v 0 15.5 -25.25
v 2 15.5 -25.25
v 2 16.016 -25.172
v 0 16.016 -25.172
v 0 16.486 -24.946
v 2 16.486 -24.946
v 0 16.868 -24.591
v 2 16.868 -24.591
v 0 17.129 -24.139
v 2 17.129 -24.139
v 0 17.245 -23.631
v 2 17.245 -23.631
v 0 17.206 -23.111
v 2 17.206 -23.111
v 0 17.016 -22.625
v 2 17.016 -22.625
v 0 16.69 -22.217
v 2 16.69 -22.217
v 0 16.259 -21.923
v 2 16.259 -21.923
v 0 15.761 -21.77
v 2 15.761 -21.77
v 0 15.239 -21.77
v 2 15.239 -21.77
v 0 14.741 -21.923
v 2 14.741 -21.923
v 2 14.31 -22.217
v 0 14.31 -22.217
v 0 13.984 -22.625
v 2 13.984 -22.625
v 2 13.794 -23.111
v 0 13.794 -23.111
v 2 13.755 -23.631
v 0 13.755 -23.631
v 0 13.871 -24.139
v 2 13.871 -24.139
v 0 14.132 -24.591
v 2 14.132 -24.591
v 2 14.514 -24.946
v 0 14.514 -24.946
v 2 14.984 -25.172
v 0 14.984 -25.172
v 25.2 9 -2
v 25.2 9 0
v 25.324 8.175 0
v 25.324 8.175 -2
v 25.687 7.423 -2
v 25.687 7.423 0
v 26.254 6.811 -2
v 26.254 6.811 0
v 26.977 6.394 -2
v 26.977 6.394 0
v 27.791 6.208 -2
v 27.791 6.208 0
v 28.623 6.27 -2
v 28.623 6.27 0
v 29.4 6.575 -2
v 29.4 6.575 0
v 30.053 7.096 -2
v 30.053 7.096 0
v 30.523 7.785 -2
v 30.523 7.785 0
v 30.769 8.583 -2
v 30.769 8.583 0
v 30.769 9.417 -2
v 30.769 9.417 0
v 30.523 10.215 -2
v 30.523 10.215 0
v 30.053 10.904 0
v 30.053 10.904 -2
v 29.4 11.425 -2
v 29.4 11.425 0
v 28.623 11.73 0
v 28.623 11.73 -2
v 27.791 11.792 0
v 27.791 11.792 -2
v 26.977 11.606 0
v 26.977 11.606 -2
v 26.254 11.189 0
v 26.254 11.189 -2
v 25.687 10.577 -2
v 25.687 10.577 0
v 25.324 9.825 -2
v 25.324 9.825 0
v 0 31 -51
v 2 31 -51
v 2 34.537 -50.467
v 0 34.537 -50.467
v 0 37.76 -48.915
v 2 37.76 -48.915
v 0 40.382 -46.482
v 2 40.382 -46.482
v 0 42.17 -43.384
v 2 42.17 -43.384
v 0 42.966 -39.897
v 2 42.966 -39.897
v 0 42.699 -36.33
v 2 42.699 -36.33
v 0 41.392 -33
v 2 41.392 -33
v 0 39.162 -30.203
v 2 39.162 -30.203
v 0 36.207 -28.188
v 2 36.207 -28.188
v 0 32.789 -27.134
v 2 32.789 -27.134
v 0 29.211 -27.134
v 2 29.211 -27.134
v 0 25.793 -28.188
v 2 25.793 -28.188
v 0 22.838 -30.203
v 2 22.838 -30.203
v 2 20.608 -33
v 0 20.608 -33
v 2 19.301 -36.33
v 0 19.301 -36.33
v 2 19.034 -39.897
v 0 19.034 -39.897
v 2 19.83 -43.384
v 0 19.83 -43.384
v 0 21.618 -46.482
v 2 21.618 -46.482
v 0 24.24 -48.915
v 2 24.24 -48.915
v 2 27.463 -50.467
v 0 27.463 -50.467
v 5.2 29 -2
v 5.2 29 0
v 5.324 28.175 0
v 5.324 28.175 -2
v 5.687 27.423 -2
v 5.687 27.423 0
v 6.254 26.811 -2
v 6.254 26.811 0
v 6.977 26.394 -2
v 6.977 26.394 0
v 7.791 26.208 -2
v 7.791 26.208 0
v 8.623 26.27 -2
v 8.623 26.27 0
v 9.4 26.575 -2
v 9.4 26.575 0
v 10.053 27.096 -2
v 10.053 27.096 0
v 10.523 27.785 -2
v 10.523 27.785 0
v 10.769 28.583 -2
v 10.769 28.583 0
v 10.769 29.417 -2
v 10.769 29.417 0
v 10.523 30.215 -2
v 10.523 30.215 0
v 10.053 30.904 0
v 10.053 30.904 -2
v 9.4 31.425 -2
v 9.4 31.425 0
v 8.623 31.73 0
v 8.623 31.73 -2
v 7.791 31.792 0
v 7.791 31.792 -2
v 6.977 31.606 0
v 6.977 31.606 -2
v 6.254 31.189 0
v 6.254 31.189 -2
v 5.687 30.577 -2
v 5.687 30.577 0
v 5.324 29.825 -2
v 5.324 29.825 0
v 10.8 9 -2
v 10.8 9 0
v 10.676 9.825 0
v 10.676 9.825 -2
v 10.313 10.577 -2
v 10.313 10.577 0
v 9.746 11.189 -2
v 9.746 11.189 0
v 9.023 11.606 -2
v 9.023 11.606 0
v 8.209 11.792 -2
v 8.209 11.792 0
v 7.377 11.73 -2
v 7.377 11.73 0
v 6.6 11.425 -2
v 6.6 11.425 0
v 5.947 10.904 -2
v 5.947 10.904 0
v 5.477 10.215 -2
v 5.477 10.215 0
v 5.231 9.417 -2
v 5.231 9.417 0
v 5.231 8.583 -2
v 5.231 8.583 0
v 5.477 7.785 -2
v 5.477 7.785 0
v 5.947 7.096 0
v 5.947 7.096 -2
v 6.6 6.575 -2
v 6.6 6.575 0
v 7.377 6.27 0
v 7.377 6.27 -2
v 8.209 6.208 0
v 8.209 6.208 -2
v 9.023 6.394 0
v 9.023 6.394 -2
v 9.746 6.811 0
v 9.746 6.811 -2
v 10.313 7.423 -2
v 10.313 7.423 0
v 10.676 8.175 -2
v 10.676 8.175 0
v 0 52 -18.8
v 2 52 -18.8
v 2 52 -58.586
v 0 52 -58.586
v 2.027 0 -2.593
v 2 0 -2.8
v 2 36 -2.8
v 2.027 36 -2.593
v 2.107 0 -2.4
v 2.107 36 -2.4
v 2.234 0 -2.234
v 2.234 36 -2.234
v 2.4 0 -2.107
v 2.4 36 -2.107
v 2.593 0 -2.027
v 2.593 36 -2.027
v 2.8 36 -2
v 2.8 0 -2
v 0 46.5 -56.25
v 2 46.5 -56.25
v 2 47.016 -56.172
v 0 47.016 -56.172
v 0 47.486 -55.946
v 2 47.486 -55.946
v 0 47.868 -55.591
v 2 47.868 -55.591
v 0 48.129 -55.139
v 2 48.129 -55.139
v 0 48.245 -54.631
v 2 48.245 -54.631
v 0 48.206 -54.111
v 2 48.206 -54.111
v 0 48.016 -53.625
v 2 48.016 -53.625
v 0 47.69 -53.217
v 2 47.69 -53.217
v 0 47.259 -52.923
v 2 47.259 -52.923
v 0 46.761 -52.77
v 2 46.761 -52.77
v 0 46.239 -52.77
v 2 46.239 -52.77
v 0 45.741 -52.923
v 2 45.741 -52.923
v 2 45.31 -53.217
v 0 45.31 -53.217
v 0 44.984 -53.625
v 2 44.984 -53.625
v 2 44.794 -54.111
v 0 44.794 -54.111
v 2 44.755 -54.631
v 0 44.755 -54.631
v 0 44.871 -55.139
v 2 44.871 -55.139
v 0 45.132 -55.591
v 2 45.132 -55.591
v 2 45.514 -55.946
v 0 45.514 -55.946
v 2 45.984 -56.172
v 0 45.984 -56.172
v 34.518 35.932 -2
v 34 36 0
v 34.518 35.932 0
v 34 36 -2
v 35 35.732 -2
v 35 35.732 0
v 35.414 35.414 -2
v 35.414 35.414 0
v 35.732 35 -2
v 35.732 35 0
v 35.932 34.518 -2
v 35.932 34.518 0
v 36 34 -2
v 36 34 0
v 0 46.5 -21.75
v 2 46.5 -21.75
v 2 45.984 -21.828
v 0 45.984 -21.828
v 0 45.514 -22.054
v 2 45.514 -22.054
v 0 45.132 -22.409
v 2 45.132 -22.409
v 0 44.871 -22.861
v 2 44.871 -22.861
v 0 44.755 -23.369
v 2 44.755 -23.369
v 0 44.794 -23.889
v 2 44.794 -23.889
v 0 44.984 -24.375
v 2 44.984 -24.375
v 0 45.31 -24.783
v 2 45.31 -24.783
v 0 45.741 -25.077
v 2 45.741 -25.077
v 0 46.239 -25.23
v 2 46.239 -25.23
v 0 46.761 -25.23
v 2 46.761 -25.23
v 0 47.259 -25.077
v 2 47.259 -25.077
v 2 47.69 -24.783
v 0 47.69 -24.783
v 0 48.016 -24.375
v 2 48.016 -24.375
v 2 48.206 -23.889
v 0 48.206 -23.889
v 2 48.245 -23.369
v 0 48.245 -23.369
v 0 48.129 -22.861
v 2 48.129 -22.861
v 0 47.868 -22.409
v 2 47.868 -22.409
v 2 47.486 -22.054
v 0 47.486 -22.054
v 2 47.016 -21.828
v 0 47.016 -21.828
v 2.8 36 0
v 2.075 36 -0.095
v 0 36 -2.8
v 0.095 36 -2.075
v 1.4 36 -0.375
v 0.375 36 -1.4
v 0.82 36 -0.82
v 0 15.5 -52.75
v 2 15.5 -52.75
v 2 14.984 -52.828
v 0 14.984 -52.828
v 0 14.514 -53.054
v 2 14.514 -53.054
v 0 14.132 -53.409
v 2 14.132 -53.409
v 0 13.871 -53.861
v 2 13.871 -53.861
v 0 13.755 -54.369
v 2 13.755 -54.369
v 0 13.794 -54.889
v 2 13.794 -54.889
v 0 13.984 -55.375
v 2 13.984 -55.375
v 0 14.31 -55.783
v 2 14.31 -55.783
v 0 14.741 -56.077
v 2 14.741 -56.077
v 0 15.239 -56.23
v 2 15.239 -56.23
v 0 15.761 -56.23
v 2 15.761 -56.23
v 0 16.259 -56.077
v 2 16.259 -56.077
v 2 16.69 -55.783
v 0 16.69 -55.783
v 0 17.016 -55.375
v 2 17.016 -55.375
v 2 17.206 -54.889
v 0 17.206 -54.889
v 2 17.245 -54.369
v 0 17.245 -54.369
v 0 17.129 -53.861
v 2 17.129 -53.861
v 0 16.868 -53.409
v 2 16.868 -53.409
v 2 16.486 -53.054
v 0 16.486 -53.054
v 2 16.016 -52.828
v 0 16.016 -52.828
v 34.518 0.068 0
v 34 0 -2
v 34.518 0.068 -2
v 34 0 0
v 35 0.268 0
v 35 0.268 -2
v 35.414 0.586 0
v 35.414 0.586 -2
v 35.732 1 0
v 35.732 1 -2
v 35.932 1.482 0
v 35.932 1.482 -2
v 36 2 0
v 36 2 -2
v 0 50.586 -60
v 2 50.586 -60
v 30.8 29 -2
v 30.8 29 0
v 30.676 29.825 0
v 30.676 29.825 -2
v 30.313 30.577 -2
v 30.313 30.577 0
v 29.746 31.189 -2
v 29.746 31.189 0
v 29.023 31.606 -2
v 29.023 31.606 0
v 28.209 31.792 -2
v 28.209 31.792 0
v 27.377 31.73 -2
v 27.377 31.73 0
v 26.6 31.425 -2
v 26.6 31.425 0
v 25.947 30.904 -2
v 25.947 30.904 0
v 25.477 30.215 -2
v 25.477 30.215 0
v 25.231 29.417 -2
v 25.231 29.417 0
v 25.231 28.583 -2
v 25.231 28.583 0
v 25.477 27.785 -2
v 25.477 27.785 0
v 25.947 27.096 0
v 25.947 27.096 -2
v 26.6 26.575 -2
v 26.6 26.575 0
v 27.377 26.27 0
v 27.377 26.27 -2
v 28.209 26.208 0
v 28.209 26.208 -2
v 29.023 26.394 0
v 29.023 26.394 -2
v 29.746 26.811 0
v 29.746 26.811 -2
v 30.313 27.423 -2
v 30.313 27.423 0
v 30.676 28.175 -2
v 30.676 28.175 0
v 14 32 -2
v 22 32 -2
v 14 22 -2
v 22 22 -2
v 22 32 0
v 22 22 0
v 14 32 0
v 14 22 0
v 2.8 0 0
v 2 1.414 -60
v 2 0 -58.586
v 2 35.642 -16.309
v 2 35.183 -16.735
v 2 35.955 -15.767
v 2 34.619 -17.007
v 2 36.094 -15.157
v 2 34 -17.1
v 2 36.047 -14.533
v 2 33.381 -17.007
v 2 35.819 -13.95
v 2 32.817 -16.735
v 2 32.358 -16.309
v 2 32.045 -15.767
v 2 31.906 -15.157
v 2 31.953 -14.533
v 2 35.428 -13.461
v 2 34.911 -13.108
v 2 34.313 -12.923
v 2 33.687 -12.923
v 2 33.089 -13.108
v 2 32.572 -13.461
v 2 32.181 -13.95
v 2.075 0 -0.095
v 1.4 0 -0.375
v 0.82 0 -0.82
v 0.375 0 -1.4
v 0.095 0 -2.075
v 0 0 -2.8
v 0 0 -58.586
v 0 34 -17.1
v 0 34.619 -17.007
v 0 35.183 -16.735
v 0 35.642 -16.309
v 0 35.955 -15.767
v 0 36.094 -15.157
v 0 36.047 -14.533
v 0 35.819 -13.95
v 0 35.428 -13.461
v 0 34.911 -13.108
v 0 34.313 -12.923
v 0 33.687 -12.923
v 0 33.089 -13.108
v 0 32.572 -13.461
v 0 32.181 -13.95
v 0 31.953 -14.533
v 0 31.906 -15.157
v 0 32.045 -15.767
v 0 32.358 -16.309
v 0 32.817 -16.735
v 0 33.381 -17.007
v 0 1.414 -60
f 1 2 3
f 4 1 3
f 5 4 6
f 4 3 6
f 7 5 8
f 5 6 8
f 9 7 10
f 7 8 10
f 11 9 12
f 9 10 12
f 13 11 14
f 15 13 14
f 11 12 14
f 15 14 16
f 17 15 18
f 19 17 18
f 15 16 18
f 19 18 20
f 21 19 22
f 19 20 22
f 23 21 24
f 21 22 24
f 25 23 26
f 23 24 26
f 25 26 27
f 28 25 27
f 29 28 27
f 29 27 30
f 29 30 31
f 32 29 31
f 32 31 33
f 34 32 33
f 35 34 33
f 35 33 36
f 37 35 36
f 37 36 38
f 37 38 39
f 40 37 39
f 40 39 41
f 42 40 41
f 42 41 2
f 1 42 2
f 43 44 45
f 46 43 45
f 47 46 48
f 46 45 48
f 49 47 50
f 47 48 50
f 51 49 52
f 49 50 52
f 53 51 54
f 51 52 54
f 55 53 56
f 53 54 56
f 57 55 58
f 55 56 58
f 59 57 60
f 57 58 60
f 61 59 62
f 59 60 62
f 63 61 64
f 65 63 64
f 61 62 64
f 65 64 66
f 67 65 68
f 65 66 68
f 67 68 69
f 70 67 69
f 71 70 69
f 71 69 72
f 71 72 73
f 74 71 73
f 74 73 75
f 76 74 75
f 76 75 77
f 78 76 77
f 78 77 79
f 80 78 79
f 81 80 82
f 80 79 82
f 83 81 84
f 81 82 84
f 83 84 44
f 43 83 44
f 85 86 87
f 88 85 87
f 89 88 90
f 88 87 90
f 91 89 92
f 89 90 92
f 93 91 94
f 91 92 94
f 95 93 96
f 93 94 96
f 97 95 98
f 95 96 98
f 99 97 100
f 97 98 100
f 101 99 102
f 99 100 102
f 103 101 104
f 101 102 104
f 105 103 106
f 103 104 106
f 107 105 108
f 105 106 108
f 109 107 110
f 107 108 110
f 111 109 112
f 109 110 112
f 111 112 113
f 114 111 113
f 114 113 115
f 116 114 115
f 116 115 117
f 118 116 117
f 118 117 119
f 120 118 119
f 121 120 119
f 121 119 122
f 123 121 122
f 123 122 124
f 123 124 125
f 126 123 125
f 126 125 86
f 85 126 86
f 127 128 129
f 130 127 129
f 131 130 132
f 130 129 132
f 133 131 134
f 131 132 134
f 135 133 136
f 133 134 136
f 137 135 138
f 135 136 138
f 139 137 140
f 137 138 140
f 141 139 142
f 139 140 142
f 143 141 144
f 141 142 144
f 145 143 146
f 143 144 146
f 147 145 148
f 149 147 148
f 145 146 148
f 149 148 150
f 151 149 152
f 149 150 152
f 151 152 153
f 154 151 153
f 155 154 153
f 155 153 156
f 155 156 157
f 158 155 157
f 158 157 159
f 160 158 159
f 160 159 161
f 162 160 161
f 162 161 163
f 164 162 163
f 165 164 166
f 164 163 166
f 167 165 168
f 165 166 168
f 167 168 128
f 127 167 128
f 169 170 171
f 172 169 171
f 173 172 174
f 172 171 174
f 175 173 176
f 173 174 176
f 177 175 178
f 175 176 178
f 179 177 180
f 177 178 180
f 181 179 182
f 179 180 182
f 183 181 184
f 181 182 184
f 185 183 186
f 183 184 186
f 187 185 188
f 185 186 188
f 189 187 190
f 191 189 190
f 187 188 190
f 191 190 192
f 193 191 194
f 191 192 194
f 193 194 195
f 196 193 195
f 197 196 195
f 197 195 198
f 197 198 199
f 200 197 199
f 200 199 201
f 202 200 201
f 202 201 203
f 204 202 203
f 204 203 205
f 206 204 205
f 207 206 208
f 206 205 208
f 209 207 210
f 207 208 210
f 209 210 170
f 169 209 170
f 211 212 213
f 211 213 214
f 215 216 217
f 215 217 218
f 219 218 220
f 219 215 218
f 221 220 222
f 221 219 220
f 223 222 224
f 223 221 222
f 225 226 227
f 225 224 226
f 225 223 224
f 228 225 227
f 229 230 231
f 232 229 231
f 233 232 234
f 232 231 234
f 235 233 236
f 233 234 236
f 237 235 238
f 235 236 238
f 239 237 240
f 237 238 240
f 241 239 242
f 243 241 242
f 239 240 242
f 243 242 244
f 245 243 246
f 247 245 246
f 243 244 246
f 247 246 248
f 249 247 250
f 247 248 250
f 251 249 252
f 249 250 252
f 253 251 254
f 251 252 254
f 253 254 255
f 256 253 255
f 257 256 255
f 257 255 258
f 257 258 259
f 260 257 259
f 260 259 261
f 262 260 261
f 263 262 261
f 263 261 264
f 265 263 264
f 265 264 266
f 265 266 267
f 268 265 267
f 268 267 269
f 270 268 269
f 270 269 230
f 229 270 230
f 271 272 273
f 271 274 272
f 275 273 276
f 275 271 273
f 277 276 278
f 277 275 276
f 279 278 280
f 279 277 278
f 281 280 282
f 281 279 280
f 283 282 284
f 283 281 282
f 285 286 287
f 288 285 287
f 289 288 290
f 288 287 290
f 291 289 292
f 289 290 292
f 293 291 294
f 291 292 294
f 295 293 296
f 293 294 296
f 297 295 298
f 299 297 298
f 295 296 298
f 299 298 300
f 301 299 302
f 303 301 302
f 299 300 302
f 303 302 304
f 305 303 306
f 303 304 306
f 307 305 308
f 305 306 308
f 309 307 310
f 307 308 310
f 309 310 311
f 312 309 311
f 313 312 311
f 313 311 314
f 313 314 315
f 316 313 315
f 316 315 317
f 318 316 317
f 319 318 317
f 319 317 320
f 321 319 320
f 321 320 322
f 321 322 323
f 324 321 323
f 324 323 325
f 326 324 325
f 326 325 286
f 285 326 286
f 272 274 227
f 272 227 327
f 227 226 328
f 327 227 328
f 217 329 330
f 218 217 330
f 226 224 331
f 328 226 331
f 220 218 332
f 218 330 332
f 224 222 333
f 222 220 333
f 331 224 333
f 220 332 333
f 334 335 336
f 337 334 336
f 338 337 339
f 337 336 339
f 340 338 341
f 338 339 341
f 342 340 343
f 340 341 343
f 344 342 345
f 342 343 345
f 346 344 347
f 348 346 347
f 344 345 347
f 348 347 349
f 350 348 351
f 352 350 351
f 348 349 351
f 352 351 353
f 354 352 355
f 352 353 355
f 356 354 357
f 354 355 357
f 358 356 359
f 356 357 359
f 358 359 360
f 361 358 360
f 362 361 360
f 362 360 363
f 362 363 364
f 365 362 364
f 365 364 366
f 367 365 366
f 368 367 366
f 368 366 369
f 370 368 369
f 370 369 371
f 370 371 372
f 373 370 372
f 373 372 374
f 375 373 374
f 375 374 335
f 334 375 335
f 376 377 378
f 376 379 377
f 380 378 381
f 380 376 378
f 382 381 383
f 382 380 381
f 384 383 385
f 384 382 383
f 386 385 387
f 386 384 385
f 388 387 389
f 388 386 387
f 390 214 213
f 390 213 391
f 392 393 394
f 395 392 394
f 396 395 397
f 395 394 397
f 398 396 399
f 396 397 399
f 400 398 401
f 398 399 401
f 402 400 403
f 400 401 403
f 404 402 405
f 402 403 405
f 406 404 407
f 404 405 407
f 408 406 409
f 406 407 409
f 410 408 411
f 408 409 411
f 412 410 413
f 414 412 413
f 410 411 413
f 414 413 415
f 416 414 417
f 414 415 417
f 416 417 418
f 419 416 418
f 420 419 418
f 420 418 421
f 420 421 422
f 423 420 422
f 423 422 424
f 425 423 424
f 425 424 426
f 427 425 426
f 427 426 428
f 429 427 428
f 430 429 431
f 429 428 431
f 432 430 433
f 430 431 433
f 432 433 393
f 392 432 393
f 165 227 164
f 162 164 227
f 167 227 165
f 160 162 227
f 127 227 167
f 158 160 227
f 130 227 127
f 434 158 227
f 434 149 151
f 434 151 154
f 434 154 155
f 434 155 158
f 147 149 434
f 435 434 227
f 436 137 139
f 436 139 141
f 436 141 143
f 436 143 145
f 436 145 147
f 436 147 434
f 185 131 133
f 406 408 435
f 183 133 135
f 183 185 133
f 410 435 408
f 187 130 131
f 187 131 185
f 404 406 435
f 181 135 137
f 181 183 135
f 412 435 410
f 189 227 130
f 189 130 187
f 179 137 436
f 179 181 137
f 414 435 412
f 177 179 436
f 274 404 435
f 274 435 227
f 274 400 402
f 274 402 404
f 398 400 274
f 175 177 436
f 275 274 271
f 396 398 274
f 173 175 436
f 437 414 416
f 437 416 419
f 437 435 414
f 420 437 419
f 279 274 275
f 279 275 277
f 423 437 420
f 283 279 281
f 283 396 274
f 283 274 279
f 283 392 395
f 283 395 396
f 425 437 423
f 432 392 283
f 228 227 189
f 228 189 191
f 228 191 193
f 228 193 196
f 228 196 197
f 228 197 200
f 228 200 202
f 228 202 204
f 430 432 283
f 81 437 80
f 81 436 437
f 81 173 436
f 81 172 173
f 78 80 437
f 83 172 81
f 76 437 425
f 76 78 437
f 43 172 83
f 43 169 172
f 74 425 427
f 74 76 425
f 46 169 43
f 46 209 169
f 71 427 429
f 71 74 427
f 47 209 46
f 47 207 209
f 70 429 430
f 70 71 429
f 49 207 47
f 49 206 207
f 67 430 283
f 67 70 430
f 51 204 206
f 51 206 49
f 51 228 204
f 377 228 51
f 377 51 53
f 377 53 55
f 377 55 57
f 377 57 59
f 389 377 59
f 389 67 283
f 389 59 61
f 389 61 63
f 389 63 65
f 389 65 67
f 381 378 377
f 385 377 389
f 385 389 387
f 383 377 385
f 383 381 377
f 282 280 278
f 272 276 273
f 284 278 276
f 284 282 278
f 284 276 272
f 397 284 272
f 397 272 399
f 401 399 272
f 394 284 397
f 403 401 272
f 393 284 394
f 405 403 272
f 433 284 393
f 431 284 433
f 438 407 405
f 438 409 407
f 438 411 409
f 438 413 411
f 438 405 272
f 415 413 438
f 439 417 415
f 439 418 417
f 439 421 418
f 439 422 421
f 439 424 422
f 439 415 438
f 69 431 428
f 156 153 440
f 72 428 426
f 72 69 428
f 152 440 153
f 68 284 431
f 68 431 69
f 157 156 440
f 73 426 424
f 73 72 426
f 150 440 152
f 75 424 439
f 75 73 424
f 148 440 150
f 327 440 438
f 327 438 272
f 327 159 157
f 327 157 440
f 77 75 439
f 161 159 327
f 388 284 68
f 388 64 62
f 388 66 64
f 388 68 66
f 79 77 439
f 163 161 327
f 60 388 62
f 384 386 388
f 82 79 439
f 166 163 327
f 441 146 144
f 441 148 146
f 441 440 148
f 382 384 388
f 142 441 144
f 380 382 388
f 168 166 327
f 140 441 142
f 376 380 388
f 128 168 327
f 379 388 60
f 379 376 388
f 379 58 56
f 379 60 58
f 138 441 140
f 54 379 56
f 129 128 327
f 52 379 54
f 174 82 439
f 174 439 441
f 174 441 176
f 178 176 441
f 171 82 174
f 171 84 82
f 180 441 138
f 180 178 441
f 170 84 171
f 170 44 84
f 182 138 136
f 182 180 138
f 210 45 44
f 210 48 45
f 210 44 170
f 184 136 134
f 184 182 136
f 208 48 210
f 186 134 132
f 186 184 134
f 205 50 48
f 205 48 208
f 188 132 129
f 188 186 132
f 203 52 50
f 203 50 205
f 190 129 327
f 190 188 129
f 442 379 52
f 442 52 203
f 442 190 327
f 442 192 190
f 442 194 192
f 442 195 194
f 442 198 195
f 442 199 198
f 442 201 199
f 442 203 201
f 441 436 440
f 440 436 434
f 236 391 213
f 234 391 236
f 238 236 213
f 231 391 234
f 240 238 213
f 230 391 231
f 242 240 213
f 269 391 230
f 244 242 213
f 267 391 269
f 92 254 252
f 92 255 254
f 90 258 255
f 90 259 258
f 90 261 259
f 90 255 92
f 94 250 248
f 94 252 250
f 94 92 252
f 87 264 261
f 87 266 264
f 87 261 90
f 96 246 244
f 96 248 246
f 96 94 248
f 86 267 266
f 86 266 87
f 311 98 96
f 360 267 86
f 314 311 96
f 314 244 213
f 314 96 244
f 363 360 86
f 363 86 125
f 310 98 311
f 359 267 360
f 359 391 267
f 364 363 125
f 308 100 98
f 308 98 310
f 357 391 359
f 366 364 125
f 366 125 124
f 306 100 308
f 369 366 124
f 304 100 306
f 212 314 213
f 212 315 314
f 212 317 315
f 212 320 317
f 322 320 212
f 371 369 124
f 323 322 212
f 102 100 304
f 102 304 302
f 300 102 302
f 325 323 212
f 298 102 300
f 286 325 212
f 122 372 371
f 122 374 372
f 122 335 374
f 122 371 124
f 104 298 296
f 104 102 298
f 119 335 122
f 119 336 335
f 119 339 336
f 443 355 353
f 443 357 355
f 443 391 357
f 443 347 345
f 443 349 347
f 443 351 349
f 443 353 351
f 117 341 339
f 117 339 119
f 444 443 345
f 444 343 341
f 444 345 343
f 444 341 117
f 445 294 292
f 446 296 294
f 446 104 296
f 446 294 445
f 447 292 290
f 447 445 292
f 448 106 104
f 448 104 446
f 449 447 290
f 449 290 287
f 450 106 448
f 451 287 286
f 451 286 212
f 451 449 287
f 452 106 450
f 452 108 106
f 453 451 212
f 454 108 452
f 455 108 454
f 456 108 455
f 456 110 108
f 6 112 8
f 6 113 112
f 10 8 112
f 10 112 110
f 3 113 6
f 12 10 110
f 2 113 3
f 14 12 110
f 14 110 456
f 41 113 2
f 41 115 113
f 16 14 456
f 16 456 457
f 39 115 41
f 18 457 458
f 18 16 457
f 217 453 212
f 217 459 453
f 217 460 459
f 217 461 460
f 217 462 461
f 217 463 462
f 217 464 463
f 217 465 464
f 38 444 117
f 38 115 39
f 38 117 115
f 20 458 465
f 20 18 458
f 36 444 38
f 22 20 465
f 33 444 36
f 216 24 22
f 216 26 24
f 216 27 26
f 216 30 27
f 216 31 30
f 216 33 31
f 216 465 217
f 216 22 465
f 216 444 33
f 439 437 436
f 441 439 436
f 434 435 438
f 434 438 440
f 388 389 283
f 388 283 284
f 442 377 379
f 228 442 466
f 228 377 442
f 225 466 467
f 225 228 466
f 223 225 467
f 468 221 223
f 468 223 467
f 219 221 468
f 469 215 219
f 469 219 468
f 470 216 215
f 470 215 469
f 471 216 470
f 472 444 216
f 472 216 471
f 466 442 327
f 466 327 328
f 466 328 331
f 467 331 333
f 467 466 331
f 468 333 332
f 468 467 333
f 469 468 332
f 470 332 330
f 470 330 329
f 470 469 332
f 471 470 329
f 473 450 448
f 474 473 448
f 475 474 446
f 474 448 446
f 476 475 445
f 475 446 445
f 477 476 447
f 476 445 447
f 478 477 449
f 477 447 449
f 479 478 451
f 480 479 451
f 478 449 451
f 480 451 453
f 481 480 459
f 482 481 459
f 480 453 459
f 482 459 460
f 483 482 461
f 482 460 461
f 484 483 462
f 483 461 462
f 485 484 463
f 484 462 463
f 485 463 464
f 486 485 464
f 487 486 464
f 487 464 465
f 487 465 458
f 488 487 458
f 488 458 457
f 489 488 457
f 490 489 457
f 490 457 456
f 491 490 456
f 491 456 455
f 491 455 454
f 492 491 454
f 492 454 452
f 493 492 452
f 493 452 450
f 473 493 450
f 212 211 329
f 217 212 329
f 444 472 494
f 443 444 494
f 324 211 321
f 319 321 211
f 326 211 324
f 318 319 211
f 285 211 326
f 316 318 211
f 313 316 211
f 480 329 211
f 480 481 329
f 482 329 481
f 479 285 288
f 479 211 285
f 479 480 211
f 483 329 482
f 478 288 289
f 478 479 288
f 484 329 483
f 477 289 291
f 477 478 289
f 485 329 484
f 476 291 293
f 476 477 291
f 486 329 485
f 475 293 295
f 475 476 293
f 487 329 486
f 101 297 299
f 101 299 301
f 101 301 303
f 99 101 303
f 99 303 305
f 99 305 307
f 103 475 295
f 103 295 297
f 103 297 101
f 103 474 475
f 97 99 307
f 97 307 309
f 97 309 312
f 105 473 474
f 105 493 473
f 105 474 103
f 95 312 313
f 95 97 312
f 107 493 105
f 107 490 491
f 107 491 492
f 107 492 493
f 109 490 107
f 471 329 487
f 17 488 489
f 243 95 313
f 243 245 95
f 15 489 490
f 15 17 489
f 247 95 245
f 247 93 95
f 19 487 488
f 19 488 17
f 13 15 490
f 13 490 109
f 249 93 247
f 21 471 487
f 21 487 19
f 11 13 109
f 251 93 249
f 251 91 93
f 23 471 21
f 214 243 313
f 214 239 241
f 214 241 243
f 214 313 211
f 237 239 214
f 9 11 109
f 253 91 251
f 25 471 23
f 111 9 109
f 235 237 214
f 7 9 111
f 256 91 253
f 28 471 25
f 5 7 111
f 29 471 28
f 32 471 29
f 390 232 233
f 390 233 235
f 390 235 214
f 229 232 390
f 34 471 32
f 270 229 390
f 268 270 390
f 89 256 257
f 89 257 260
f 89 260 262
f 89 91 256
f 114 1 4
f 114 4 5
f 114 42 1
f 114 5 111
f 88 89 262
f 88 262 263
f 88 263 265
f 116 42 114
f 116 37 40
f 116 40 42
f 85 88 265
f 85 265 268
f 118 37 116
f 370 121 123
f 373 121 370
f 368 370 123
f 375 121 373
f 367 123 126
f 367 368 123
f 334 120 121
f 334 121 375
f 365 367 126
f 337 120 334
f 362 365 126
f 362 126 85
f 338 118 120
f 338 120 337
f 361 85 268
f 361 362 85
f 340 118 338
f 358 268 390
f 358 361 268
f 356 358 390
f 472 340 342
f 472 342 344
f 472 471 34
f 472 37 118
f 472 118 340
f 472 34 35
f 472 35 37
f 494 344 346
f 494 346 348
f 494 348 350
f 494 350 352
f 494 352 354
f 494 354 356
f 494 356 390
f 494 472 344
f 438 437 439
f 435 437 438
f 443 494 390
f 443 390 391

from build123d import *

# Parameters (mm, degrees)
BASE_FLANGE1_DEPTH = 52
CUT_EXTRUDE1_DEPTH = 88.177978871
FILLET1_R          = 2
SKETCH7_R          = 12
SKETCH7_R_2        = 1.75
CUT_EXTRUDE2_DEPTH = 10
SKETCH8_R          = 2.8
CUT_EXTRUDE3_DEPTH = 2
SKETCH9_W          = 8
SKETCH9_H          = 10
CUT_EXTRUDE4_DEPTH = 10
SKETCH10_R         = 2.1
CUT_EXTRUDE5_DEPTH = 10


# Sheet-metal steps are written as plain solids
with BuildPart() as part:
    # Sketch1 → Base-Flange1 (new body)
    with BuildSketch(Plane(origin=(0, 0, 0), x_dir=(1, 0, 0), z_dir=(0, 1, 0))):
        with BuildLine():
            Line((36, 0), (2.8, 0))
            ThreePointArc((2.8, 0), (0.820101013, 0.820101013), (0, 2.8))
            Line((0, 2.8), (0, 60))
            Line((0, 60), (2, 60))
            Line((2, 60), (2, 2.8))
            ThreePointArc((2, 2.8), (2.234314575, 2.234314575), (2.8, 2))
            Line((2.8, 2), (36, 2))
            Line((36, 2), (36, 0))
        make_face()
    extrude(amount=BASE_FLANGE1_DEPTH)

    # Sketch6 → Cut-Extrude1 (cut, through all)
    with BuildSketch(Plane.ZY):
        Polygon((-18.8, 52), (-2.8, 36), (0, 36), (0, 52), align=None)
        Polygon((-60, 52), (-58.585786438, 52), (-60, 50.585786438), align=None)
        Polygon((-60, 1.414213562), (-60, 0), (-58.585786438, 0), align=None)
    extrude(amount=-CUT_EXTRUDE1_DEPTH, mode=Mode.SUBTRACT)

    # Fillet1
    fillet1_edges = [part.edges().sort_by_distance(p)[0] for p in [
        (36, 36, -1),
        (36, 0, -1),
    ]]
    fillet(fillet1_edges, radius=FILLET1_R)

    # Sketch7 → Cut-Extrude2 (cut)
    with BuildSketch(Plane(origin=(2, 0, 0), x_dir=(0, 0, -1), z_dir=(1, 0, 0))):
        with Locations((39, 31)):
            Circle(SKETCH7_R)
        with Locations((54.5, 46.5)):
            Circle(SKETCH7_R_2)
        with Locations(Location((23.5, 46.5, 0), (0, 0, 180))):
            Circle(SKETCH7_R_2)
        with Locations(Location((54.5, 15.5, 0), (0, 0, 180))):
            Circle(SKETCH7_R_2)
        with Locations((23.5, 15.5)):
            Circle(SKETCH7_R_2)
    extrude(amount=-CUT_EXTRUDE2_DEPTH, mode=Mode.SUBTRACT)

    # Sketch8 → Cut-Extrude3 (cut)
    with BuildSketch(Plane.XY):
        with Locations((28, 29)):
            Circle(SKETCH8_R)
        with Locations(Location((28, 9, 0), (0, 0, 180))):
            Circle(SKETCH8_R)
        with Locations((8, 9)):
            Circle(SKETCH8_R)
        with Locations(Location((8, 29, 0), (0, 0, 180))):
            Circle(SKETCH8_R)
    extrude(amount=-CUT_EXTRUDE3_DEPTH, mode=Mode.SUBTRACT)

    # Sketch9 → Cut-Extrude4 (cut)
    with BuildSketch(Plane(origin=(0, 0, -2), x_dir=(-1, 0, 0), z_dir=(0, 0, -1))):
        with Locations((-18, 27)):
            Rectangle(SKETCH9_W, SKETCH9_H)
    extrude(amount=-CUT_EXTRUDE4_DEPTH, mode=Mode.SUBTRACT)

    # Sketch10 → Cut-Extrude5 (cut)
    with BuildSketch(Plane(origin=(2, 0, 0), x_dir=(0, 0, -1), z_dir=(1, 0, 0))):
        with Locations((15, 34)):
            Circle(SKETCH10_R)
    extrude(amount=-CUT_EXTRUDE5_DEPTH, mode=Mode.SUBTRACT)


solid = part.part
